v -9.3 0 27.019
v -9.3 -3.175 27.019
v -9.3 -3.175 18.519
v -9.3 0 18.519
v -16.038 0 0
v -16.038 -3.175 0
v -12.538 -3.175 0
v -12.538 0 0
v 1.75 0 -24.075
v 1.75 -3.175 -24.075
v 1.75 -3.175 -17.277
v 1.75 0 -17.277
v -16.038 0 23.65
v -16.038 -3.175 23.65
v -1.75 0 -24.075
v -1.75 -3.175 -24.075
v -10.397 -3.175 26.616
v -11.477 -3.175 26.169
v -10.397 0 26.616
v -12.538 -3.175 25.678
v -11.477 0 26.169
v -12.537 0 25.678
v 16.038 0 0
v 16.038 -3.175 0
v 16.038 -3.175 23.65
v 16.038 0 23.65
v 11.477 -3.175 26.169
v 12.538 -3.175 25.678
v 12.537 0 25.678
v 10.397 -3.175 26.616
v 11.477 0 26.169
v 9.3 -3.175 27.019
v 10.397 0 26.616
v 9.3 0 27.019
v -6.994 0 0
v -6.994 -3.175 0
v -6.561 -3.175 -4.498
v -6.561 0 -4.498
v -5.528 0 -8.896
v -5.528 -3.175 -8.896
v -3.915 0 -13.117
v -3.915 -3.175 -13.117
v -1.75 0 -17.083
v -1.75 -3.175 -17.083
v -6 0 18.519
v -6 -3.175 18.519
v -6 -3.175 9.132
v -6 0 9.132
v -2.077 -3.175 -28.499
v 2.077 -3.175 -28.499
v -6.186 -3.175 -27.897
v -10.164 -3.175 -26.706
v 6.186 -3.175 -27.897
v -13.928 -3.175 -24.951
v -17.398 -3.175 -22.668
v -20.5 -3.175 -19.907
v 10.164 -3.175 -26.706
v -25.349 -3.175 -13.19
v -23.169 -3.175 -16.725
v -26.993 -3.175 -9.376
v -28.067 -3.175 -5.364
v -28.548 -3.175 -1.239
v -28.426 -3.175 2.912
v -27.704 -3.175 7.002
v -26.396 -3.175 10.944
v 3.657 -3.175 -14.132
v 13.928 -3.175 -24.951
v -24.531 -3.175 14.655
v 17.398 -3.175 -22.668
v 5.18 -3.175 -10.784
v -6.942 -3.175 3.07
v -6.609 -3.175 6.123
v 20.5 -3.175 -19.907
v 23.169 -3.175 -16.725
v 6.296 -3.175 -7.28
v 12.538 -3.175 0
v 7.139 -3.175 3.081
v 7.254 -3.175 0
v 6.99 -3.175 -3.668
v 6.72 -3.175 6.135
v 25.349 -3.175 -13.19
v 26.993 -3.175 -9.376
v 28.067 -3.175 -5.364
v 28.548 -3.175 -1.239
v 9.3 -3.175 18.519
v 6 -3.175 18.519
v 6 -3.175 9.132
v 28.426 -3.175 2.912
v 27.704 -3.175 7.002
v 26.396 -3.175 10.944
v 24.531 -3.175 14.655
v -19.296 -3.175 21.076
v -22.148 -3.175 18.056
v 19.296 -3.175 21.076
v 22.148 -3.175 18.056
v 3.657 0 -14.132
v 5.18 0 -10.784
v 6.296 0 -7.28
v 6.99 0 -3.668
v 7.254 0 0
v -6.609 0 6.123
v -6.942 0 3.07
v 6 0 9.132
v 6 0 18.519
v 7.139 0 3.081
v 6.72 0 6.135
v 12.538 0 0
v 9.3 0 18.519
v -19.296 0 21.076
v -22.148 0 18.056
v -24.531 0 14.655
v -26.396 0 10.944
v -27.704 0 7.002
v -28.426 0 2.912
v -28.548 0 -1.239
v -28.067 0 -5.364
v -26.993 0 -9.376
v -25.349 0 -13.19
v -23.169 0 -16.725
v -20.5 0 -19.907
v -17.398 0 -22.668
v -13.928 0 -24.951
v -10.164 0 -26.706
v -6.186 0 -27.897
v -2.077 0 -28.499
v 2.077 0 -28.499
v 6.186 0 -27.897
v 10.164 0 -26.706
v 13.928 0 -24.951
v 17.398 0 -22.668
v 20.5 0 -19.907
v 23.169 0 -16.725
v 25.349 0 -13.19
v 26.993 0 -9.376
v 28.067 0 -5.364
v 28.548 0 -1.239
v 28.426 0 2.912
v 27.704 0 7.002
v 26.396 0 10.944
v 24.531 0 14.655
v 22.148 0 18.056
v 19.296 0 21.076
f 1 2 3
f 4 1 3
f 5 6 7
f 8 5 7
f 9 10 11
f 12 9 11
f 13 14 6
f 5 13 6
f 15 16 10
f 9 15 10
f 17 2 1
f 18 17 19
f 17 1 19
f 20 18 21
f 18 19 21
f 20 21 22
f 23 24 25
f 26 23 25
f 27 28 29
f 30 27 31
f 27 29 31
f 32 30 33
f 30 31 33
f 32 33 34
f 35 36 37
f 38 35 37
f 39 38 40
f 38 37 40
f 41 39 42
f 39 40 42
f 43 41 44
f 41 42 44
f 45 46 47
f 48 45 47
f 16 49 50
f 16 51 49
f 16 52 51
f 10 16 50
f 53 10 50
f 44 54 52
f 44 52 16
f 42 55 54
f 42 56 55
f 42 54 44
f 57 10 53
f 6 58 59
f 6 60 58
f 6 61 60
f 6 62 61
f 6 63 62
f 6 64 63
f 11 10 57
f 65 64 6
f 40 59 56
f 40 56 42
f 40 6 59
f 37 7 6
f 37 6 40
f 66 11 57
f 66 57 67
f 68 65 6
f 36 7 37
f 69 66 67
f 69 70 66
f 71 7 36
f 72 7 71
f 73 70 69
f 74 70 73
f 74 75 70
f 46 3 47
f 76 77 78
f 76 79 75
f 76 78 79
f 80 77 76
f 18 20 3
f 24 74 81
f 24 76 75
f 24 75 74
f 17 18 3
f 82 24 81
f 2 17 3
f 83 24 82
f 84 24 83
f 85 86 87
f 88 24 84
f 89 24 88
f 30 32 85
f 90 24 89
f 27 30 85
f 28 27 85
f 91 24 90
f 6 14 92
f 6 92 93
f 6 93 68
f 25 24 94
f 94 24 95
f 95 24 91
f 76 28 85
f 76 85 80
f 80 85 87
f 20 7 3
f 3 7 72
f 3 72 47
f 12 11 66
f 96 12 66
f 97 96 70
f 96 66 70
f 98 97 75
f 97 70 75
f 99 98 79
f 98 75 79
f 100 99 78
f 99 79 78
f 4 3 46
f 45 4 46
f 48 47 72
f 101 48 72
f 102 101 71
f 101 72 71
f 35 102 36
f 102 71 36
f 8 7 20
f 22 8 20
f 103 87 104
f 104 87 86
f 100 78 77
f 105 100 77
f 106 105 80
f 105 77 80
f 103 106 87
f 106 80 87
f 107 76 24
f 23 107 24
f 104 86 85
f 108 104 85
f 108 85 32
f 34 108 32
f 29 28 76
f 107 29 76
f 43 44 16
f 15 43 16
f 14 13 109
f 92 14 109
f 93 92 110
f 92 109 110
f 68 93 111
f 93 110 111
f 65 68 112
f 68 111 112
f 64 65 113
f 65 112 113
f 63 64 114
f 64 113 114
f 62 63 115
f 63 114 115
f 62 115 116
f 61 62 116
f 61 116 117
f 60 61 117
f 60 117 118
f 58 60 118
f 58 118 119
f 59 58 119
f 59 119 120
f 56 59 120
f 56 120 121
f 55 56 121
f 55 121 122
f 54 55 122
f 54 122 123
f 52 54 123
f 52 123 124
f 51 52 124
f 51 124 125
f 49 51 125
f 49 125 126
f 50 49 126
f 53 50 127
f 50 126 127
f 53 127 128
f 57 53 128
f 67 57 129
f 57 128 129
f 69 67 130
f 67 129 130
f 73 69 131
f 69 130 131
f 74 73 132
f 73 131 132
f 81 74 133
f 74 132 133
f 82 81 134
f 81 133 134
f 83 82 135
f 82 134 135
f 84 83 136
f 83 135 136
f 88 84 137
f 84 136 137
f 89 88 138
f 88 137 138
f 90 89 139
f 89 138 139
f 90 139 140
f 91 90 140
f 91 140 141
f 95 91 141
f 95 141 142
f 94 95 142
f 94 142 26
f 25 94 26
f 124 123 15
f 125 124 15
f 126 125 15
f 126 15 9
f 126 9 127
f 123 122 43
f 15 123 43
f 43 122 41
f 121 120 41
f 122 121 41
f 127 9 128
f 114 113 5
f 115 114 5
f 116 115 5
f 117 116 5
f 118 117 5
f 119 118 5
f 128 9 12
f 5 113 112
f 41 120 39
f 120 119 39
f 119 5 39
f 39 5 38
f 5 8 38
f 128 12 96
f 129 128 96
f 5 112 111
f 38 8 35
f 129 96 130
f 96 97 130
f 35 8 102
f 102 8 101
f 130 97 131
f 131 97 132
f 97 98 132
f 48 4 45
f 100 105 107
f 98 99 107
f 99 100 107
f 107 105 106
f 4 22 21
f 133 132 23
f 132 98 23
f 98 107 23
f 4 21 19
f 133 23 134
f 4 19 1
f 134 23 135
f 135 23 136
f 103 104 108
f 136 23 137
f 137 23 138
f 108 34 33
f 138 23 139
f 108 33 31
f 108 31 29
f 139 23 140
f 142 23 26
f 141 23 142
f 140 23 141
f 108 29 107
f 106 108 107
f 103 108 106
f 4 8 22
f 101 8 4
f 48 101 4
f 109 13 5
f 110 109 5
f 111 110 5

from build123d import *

# Parameters (mm, degrees)
F0_R     = 28.575
F1_DEPTH = 3.175
F3_DEPTH = 3.176


# Not quite as in the source:
# - a length typed as a fraction of an inch, garbled in the dataset ("3 / 203.2 mm" for 3/8 in), is restored


with BuildPart() as f1:
    # F0 (on Front) → F1 (new body)
    with BuildSketch(Plane.XZ):
        Circle(F0_R)
    extrude(amount=F1_DEPTH)

    # F2 (on face) → F3 (cut, through all)
    with BuildSketch(Plane.XZ.offset(3.175)):
        with BuildLine():
            Line((-1.75, -17.08304261), (-1.75, -24.075))
            Line((-1.75, -24.075), (0, -24.075))
            Line((0, -24.075), (0, -19.575))
            ThreePointArc((0, -19.575), (-0.9032383957, -18.3488519781), (-1.75, -17.08304261))
        make_face()
        with BuildLine():
            Line((0, -19.575), (0, -24.075))
            Line((0, -24.075), (1.75, -24.075))
            Line((1.75, -24.075), (1.75, -17.2770230976))
            ThreePointArc((1.75, -17.2770230976), (0.9017072988, -18.4463502097), (0, -19.575))
        make_face()
        with BuildLine():
            ThreePointArc((-6.9936556862, 0), (-5.528073584, -8.8964320017), (-1.75, -17.08304261))
            ThreePointArc((-1.75, -17.08304261), (-0.9032383957, -18.3488519781), (0, -19.575))
            Line((0, -19.575), (0, 0))
            Line((0, 0), (-6.9936556862, 0))
        make_face()
        with BuildLine():
            Line((0, 0), (0, -19.575))
            ThreePointArc((0, -19.575), (0.9017072988, -18.4463502097), (1.75, -17.2770230976))
            ThreePointArc((1.75, -17.2770230976), (5.789623043, -9.0487471984), (7.2536082684, 0))
            Line((7.2536082684, 0), (0, 0))
        make_face()
        with BuildLine():
            ThreePointArc((-6, 9.1323722154), (-6.8103344804, 4.6002974695), (-6.9936556862, 0))
            Line((-6.9936556862, 0), (0, 0))
            Line((0, 0), (7.2536082684, 0))
            ThreePointArc((7.2536082684, 0), (6.9672213091, 4.6129154541), (6, 9.1323722154))
            Line((6, 9.1323722154), (6, 18.5192639611))
            Line((6, 18.5192639611), (9.3, 18.5192639611))
            Line((9.3, 18.5192639611), (9.3, 27.0192639611))
            ThreePointArc((9.3, 27.0192639611), (0, 28.575), (-9.3, 27.0192639611))
            Line((-9.3, 27.0192639611), (-9.3, 18.5192639611))
            Line((-9.3, 18.5192639611), (-6, 18.5192639611))
            Line((-6, 18.5192639611), (-6, 9.1323722154))
        make_face()
        with BuildLine():
            Line((12.5375, 0), (16.0375, 0))
            Line((16.0375, 0), (16.0375, 23.650142045))
            ThreePointArc((16.0375, 23.650142045), (14.3234197578, 24.7259028438), (12.5375, 25.6776501797))
            Line((12.5375, 25.6776501797), (12.5375, 0))
        make_face()
        with BuildLine():
            Line((-16.0375, 0), (-12.5375, 0))
            Line((-12.5375, 0), (-12.5375, 25.6776501797))
            ThreePointArc((-12.5375, 25.6776501797), (-14.3234197578, 24.7259028438), (-16.0375, 23.650142045))
            Line((-16.0375, 23.650142045), (-16.0375, 0))
        make_face()
    extrude(amount=-F3_DEPTH, mode=Mode.SUBTRACT)


solid = f1.part
